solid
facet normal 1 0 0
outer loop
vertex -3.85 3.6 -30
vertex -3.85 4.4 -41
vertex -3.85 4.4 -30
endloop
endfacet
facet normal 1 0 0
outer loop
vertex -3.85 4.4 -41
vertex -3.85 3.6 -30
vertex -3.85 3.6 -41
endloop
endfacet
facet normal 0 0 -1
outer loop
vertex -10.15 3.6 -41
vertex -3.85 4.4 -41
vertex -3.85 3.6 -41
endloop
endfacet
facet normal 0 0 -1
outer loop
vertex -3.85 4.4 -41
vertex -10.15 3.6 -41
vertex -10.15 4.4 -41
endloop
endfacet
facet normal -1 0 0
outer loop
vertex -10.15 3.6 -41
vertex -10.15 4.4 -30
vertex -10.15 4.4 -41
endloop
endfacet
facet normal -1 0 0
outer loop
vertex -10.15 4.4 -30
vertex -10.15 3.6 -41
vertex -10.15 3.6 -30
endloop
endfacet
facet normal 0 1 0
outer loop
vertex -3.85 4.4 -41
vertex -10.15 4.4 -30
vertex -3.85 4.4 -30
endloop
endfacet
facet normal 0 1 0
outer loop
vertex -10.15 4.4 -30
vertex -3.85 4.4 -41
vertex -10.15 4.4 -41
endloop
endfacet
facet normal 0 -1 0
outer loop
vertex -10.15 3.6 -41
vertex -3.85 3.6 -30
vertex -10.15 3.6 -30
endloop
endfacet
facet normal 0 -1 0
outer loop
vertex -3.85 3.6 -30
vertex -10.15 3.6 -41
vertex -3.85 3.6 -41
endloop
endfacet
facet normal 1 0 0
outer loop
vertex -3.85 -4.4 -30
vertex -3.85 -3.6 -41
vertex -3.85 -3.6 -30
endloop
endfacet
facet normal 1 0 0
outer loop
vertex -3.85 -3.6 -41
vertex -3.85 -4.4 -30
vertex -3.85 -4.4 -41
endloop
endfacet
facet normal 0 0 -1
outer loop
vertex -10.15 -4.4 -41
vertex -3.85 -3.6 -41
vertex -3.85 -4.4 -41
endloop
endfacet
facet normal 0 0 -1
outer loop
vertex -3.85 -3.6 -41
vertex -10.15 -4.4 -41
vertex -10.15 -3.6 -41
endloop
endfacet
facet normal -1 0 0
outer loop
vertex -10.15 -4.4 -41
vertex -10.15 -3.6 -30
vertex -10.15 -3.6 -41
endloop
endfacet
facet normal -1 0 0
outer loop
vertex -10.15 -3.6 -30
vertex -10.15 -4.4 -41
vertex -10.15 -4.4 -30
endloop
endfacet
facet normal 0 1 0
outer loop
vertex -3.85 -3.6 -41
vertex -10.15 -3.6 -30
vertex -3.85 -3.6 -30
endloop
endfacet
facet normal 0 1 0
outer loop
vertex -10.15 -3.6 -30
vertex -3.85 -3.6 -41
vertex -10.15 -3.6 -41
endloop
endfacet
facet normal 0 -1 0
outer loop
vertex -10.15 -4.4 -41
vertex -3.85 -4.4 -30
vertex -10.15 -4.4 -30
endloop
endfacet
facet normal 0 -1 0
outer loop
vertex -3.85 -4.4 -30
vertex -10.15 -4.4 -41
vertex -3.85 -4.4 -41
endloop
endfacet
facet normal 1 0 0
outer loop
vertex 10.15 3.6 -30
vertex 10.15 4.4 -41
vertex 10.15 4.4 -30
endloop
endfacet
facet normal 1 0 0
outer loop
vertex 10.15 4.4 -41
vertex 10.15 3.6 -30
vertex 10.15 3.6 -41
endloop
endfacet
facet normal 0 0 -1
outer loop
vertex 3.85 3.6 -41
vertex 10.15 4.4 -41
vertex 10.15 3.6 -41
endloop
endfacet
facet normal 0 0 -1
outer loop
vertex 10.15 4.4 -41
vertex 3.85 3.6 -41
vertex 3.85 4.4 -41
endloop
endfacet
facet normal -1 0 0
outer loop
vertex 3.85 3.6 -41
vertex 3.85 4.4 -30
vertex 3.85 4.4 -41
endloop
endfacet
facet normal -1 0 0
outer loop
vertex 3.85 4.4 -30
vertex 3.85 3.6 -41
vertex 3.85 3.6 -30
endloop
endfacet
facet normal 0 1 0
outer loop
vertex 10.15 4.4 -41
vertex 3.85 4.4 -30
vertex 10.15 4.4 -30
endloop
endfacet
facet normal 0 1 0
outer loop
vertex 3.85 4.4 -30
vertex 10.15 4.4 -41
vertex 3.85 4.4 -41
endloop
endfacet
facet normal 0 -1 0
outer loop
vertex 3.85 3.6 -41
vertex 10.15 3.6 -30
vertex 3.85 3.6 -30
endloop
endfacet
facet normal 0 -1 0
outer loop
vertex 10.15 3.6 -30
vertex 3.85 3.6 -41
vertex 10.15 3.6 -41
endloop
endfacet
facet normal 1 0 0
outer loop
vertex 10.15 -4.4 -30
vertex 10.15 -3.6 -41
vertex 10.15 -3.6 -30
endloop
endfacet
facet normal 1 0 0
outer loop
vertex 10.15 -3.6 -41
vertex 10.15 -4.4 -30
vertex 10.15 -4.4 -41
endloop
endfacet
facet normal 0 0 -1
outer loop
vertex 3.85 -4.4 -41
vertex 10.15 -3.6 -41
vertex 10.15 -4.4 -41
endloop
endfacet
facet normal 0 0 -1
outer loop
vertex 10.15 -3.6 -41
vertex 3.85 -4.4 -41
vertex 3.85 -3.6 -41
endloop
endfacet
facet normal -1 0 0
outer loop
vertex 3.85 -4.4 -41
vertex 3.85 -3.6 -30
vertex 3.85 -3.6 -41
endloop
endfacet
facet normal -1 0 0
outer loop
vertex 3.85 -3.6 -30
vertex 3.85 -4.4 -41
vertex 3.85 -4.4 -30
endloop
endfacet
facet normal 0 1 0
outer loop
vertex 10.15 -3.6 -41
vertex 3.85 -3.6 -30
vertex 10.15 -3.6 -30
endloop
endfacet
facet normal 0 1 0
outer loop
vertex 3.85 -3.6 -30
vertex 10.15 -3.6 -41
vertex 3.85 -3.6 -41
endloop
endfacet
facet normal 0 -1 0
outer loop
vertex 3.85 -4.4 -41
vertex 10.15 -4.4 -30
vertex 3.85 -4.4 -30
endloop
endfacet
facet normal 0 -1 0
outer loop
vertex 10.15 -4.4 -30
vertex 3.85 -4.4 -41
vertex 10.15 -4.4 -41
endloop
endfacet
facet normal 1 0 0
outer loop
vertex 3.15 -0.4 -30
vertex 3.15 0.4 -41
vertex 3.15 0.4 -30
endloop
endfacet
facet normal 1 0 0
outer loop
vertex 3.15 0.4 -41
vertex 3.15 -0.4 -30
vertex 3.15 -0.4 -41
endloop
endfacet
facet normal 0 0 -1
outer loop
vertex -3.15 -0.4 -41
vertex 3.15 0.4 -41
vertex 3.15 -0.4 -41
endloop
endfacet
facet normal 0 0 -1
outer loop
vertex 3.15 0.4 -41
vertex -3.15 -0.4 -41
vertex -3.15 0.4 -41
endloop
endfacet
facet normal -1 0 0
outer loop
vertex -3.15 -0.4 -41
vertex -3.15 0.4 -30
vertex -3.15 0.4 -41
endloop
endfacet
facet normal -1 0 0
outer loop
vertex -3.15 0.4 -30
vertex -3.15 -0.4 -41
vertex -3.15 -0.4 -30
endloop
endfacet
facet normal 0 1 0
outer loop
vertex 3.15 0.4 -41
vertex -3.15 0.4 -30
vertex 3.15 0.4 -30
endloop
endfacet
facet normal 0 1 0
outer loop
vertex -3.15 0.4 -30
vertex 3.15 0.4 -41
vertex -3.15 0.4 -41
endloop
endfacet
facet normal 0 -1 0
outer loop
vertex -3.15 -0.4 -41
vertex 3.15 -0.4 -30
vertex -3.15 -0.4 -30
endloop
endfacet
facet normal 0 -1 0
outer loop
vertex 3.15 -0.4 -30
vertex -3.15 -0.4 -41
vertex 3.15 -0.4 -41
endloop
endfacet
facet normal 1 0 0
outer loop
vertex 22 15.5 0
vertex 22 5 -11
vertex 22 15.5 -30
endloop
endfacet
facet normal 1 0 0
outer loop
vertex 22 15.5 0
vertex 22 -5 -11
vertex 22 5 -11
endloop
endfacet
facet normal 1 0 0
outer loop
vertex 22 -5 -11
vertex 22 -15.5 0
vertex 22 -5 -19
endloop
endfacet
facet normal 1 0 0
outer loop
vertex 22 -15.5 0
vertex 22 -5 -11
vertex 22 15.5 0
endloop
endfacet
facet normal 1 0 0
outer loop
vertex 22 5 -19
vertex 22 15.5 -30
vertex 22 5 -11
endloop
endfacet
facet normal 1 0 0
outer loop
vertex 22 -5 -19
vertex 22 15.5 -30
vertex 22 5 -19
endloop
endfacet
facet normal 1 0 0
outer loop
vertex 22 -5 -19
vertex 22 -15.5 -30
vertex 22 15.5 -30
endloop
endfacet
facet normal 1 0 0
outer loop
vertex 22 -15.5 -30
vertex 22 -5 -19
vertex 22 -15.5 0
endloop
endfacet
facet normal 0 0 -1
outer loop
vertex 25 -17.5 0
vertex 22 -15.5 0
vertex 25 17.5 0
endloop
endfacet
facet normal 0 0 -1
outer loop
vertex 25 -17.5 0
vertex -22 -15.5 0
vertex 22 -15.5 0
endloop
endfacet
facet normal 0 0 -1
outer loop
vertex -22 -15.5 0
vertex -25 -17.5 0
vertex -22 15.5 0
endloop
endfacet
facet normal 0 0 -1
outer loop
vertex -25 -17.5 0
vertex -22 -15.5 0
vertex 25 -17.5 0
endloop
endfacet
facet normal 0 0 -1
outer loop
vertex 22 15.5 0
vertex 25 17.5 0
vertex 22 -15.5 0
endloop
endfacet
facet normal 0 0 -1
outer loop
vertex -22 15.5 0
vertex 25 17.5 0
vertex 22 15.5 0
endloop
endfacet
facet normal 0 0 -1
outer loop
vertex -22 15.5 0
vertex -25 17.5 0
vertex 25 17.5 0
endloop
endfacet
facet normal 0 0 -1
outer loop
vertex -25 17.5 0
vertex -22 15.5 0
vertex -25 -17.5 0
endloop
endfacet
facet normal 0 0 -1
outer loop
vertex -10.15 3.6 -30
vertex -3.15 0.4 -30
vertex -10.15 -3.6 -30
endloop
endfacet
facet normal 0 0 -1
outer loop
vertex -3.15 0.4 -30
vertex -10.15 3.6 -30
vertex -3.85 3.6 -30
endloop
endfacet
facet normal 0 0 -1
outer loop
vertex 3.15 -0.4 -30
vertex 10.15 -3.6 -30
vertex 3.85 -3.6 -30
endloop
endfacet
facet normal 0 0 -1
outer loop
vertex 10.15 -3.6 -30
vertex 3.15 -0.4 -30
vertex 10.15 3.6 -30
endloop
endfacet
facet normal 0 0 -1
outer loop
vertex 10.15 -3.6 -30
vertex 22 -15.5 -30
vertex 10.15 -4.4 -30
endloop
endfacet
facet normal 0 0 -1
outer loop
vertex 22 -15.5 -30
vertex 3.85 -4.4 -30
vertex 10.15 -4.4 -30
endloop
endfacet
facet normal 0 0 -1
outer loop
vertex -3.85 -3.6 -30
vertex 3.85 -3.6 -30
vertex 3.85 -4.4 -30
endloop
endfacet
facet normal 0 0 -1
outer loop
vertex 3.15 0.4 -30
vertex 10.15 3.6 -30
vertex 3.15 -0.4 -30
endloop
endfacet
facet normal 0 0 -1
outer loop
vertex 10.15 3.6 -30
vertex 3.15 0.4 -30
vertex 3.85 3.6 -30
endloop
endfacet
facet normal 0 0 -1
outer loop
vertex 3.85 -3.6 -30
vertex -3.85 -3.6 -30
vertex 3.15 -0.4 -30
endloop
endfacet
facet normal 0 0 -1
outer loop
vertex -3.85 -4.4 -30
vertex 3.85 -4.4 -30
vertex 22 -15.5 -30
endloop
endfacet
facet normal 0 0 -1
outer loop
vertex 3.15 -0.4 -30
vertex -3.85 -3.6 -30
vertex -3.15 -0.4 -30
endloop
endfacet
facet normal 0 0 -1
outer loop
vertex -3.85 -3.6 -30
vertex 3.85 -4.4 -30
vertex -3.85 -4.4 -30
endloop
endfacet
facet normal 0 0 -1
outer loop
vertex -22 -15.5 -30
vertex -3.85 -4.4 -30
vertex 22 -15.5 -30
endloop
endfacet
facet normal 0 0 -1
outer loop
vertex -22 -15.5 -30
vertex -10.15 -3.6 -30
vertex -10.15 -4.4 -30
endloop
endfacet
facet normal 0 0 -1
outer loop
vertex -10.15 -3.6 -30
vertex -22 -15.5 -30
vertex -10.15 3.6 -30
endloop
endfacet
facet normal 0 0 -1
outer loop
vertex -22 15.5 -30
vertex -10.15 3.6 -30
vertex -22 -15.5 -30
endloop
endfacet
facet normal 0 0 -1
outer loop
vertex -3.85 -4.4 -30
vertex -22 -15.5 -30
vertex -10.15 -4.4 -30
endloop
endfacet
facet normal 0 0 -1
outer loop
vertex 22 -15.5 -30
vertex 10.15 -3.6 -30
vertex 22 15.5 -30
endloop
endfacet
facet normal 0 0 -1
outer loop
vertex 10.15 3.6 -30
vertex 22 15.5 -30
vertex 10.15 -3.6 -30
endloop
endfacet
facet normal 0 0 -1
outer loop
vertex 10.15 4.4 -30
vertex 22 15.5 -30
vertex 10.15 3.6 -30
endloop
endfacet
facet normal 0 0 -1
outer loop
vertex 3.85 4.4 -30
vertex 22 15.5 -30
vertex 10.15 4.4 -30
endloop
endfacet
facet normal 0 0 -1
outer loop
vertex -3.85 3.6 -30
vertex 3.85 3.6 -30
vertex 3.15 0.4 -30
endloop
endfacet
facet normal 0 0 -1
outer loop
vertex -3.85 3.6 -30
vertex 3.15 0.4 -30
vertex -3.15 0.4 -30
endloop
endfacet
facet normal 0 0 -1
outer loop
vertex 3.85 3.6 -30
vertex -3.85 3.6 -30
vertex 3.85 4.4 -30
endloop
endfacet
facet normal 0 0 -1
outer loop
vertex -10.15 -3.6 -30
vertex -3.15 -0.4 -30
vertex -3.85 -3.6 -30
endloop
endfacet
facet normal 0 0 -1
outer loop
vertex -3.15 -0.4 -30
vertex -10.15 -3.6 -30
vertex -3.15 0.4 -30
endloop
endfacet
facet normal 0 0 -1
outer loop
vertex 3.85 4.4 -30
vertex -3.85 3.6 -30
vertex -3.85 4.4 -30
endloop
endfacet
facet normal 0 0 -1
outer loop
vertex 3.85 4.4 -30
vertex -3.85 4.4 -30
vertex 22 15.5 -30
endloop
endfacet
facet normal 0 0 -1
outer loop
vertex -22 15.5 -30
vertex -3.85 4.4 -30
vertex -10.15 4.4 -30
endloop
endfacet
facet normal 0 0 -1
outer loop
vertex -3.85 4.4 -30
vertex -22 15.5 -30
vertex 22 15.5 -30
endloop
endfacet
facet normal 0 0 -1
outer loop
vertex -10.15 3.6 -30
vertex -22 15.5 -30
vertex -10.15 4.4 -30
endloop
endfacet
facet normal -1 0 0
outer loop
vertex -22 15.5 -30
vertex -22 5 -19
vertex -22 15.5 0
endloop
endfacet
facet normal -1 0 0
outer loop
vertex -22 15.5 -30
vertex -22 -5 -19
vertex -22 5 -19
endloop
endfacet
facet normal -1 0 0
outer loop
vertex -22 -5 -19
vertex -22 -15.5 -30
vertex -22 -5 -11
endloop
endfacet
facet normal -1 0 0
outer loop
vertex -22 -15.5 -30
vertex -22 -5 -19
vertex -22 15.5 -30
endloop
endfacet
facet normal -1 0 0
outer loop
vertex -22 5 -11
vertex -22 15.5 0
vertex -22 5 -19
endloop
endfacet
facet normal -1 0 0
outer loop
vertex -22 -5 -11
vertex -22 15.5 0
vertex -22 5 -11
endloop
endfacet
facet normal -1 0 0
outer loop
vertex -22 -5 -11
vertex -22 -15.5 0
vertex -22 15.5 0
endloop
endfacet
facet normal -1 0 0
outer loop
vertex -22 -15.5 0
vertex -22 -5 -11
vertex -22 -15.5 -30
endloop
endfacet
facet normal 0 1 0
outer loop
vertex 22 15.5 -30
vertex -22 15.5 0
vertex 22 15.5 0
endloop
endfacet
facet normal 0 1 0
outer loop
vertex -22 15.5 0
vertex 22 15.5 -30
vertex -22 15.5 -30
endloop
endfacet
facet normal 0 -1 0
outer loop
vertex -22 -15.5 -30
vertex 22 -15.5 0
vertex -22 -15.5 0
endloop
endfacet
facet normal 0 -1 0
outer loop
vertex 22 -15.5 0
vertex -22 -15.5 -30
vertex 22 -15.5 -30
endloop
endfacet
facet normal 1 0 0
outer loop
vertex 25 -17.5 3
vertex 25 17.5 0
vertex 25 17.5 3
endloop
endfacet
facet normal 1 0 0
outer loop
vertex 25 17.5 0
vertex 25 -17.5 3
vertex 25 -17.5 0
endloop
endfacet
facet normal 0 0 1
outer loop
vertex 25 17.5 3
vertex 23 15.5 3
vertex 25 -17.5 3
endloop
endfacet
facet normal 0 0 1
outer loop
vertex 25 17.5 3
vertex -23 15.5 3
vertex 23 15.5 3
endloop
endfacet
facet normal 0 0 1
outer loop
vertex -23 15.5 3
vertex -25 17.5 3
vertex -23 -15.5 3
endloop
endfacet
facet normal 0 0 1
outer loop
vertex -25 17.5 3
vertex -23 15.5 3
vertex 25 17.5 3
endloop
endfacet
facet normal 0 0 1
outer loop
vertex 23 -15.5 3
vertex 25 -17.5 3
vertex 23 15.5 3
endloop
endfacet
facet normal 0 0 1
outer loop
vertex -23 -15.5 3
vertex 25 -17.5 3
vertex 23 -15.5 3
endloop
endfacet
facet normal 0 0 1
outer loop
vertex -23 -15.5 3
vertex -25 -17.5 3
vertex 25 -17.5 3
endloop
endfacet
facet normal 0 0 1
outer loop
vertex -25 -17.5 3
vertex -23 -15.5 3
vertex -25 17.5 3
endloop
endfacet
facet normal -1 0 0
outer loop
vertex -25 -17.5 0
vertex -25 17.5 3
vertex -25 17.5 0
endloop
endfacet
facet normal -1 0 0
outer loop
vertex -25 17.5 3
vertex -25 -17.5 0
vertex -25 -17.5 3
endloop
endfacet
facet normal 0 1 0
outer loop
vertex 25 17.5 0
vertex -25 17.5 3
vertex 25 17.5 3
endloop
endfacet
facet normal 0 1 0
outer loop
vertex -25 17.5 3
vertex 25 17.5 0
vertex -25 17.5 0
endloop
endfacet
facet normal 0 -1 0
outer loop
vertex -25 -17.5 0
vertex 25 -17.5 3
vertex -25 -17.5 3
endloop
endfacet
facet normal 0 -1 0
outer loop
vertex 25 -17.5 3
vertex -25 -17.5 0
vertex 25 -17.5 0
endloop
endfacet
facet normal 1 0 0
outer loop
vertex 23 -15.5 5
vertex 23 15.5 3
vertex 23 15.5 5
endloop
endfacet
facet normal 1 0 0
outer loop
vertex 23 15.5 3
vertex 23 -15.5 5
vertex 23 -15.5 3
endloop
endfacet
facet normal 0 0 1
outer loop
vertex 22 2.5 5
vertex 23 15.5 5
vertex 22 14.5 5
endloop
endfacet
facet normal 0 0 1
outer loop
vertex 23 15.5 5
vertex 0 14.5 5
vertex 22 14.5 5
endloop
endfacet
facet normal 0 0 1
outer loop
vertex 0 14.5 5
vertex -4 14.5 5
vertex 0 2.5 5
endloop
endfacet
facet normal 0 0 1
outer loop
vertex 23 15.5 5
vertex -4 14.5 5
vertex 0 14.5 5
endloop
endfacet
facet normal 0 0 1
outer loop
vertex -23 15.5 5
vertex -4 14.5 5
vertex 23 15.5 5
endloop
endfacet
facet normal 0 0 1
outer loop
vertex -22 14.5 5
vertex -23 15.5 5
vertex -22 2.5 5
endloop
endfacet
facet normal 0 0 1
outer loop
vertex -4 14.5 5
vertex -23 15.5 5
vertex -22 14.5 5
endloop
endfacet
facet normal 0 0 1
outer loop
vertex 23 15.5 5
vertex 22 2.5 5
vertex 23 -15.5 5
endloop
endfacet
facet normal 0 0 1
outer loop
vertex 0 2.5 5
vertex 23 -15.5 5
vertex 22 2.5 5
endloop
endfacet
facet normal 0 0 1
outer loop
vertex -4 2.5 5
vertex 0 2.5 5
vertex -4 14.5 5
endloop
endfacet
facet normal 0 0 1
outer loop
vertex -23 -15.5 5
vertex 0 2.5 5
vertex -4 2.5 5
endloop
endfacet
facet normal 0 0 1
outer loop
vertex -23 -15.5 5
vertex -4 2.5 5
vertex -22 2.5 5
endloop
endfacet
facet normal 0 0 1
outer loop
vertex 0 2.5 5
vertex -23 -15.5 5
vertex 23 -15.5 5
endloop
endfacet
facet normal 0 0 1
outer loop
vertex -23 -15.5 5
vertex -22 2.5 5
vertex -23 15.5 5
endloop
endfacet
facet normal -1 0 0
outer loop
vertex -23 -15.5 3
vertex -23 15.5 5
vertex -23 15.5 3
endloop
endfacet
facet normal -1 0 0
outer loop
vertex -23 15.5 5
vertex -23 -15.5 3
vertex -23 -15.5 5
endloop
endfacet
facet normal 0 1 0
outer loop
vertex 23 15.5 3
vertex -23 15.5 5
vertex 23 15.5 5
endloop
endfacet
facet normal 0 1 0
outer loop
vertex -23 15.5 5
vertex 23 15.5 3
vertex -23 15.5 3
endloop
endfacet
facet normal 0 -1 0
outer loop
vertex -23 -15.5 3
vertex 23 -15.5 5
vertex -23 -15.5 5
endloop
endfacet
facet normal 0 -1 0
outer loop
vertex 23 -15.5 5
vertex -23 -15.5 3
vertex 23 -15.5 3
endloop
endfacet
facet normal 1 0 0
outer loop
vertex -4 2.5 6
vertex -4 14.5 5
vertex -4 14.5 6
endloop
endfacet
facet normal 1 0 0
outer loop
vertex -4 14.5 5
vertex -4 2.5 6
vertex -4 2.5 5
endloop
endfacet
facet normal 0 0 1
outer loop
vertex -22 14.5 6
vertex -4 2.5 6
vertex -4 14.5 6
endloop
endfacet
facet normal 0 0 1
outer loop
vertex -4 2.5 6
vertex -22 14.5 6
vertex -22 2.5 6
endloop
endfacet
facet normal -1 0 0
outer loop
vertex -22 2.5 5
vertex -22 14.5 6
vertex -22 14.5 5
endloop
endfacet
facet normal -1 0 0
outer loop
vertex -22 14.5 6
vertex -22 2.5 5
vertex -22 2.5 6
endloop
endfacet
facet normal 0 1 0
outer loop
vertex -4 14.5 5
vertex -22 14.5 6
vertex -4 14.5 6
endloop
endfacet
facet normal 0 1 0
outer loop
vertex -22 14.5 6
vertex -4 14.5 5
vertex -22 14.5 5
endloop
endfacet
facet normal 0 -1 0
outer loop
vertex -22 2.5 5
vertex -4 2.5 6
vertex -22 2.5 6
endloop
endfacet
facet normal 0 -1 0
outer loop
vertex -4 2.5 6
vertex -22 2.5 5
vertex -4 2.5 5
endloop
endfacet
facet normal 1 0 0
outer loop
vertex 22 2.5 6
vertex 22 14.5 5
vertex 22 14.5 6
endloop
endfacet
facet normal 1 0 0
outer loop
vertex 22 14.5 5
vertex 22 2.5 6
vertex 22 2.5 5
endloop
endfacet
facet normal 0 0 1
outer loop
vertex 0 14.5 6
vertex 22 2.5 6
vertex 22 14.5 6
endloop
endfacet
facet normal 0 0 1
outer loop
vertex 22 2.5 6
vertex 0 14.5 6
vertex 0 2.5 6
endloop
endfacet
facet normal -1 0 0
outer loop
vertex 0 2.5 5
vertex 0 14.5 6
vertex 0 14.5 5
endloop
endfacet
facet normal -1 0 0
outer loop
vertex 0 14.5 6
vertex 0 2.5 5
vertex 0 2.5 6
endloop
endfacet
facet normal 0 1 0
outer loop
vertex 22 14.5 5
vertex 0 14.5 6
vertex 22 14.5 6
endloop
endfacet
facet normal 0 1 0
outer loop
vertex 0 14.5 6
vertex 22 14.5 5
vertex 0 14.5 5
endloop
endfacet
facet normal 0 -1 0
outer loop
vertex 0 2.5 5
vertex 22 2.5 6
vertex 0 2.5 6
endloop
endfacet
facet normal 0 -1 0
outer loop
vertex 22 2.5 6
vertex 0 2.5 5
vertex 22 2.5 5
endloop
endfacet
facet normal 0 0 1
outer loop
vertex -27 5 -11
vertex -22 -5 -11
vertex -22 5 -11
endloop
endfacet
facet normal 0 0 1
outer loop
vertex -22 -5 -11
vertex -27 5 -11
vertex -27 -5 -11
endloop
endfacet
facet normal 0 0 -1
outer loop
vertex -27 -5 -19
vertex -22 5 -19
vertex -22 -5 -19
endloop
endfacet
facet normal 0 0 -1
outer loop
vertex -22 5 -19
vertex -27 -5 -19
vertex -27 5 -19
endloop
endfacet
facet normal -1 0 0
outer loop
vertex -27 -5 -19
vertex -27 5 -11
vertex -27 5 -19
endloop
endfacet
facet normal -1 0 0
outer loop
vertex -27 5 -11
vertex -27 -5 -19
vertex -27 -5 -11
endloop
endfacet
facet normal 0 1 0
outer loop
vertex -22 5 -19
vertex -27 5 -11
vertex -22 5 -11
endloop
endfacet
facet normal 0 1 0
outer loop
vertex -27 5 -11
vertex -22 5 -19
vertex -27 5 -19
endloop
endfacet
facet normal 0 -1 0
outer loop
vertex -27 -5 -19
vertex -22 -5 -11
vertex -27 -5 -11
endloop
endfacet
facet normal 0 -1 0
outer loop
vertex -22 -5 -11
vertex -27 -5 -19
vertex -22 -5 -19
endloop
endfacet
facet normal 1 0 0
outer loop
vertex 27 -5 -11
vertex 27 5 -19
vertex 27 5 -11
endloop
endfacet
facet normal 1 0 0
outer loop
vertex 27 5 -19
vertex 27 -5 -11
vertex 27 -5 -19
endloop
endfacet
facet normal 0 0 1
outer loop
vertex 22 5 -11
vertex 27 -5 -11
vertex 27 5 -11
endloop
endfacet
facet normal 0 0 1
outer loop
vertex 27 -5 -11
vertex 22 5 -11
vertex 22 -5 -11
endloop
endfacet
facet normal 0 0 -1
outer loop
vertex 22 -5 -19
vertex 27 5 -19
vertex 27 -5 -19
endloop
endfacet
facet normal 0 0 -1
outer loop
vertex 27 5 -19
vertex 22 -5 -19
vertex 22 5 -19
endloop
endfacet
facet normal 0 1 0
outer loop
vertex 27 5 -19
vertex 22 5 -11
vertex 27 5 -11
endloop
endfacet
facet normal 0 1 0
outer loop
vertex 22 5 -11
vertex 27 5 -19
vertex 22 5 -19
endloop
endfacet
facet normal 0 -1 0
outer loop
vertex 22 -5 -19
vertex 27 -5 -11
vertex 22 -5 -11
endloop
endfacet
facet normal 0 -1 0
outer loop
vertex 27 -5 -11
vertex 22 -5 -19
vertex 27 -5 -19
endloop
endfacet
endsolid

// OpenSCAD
// Parameters
panel_cutout_width = 40.0; //[20.0:80.0:0.1]
panel_cutout_height = 27.0; //[13.5:54.0:0.1]
tolerance_clearance = 0.2; //[0.0:1.0:0.05]
panel_thickness = 2.0; //[1.0:3.0:0.1]
overlap = 1.0; //[0.5:2.0:0.1]
body_wall = 2.0; //[1.0:4.0:0.1]
body_depth = 30.0; //[15.0:60.0:0.5]
flange_width = 50.0; //[25.0:100.0:0.5]
flange_height = 35.0; //[17.5:70.0:0.5]
flange_thickness = 3.0; //[1.5:6.0:0.1]
bezel_width = 46.0; //[23.0:92.0:0.5]
bezel_height = 31.0; //[15.5:62.0:0.5]
bezel_thickness = 2.0; //[1.0:5.0:0.1]
switch_width = 18.0; //[9.0:36.0:0.5]
switch_height = 12.0; //[6.0:24.0:0.5]
switch_protrusion = 2.0; //[0.5:6.0:0.1]
fuse_width = 22.0; //[11.0:44.0:0.5]
fuse_height = 12.0; //[6.0:24.0:0.5]
fuse_protrusion = 2.0; //[0.5:6.0:0.1]
clip_width = 6.0; //[3.0:12.0:0.5]
clip_height = 10.0; //[5.0:20.0:0.5]
clip_depth = 8.0; //[4.0:20.0:0.5]
spade_width = 6.3; //[3.0:10.0:0.1]
spade_thickness = 0.8; //[0.5:2.0:0.05]
spade_length = 12.0; //[6.0:24.0:0.5]
spade_spacing_x = 7.0; //[3.5:14.0:0.5]
spade_spacing_y = 4.0; //[2.0:10.0:0.5]

// IEC Inlet Module (single connected solid)
module iec() {
  // Derived sizes
  body_w = panel_cutout_width + 2*body_wall;
  body_h = panel_cutout_height + 2*body_wall;

  // Z references (panel plane at z=0)
  body_z  = -panel_thickness/2 - body_depth/2 + overlap;                 // body overlaps into panel by "overlap"
  body_front_z = body_z + body_depth/2;                                   // should be at -panel_thickness/2 + overlap
  body_back_z  = body_z - body_depth/2;

  flange_z = panel_thickness/2 + flange_thickness/2 - overlap;            // overlaps into panel by "overlap"
  flange_front_z = flange_z + flange_thickness/2;

  bezel_z  = panel_thickness/2 + flange_thickness + bezel_thickness/2 - overlap;
  bezel_front_z = bezel_z + bezel_thickness/2;

  // Attach protrusions to bezel front face with overlap
  switch_z = bezel_front_z + switch_protrusion/2 - overlap;
  fuse_z   = bezel_front_z + fuse_protrusion/2 - overlap;

  // Attach clips to body sides with overlap
  clip_x = body_w/2 + clip_width/2 - overlap;
  clip_z = body_z; // centered with body so it intersects fully

  // Attach spades to body back face with overlap
  spade_z = body_back_z - spade_length/2 + overlap;

  color("Black")
  union() {
    // Main Body
    translate([0, 0, body_z])
      cube([body_w, body_h, body_depth], center=true);

    // Front Flange
    translate([0, 0, flange_z])
      cube([flange_width, flange_height, flange_thickness], center=true);

    // Bezel
    translate([0, 0, bezel_z])
      cube([bezel_width, bezel_height, bezel_thickness], center=true);

    // Switch Actuator Region (attached to bezel)
    translate([-(bezel_width/2 - switch_width/2 - overlap),
               (bezel_height/2 - switch_height/2 - overlap),
               switch_z])
      cube([switch_width, switch_height, switch_protrusion], center=true);

    // Fuse Drawer Region (attached to bezel)
    translate([(bezel_width/2 - fuse_width/2 - overlap),
               (bezel_height/2 - fuse_height/2 - overlap),
               fuse_z])
      cube([fuse_width, fuse_height, fuse_protrusion], center=true);

    // Mounting Clips (attached to body sides)
    translate([-clip_x, 0, clip_z])
      cube([clip_width, clip_height, clip_depth], center=true);
    translate([ clip_x, 0, clip_z])
      cube([clip_width, clip_height, clip_depth], center=true);

    // Rear Terminal Spades (attached to body back)
    for (p = [
      [-spade_spacing_x,  spade_spacing_y],
      [-spade_spacing_x, -spade_spacing_y],
      [ spade_spacing_x,  spade_spacing_y],
      [ spade_spacing_x, -spade_spacing_y],
      [0, 0]
    ]) {
      translate([p[0], p[1], spade_z])
        cube([spade_width, spade_thickness, spade_length], center=true);
    }
  }
}

// Panel Cutout Profile (kept separate visual/reference; does not affect IEC solidity)
module panel_cutout_profile() {
  color("Silver")
    translate([0, 0, 0])
      cube([panel_cutout_width + 2*tolerance_clearance,
            panel_cutout_height + 2*tolerance_clearance,
            panel_thickness], center=true);
}

// Final Assembly (IEC exists and is a single unioned solid)
module assembly() {
  union() {
    iec(); // required part present
    // panel_cutout_profile(); // optional reference; uncomment if desired
  }
}

assembly();
